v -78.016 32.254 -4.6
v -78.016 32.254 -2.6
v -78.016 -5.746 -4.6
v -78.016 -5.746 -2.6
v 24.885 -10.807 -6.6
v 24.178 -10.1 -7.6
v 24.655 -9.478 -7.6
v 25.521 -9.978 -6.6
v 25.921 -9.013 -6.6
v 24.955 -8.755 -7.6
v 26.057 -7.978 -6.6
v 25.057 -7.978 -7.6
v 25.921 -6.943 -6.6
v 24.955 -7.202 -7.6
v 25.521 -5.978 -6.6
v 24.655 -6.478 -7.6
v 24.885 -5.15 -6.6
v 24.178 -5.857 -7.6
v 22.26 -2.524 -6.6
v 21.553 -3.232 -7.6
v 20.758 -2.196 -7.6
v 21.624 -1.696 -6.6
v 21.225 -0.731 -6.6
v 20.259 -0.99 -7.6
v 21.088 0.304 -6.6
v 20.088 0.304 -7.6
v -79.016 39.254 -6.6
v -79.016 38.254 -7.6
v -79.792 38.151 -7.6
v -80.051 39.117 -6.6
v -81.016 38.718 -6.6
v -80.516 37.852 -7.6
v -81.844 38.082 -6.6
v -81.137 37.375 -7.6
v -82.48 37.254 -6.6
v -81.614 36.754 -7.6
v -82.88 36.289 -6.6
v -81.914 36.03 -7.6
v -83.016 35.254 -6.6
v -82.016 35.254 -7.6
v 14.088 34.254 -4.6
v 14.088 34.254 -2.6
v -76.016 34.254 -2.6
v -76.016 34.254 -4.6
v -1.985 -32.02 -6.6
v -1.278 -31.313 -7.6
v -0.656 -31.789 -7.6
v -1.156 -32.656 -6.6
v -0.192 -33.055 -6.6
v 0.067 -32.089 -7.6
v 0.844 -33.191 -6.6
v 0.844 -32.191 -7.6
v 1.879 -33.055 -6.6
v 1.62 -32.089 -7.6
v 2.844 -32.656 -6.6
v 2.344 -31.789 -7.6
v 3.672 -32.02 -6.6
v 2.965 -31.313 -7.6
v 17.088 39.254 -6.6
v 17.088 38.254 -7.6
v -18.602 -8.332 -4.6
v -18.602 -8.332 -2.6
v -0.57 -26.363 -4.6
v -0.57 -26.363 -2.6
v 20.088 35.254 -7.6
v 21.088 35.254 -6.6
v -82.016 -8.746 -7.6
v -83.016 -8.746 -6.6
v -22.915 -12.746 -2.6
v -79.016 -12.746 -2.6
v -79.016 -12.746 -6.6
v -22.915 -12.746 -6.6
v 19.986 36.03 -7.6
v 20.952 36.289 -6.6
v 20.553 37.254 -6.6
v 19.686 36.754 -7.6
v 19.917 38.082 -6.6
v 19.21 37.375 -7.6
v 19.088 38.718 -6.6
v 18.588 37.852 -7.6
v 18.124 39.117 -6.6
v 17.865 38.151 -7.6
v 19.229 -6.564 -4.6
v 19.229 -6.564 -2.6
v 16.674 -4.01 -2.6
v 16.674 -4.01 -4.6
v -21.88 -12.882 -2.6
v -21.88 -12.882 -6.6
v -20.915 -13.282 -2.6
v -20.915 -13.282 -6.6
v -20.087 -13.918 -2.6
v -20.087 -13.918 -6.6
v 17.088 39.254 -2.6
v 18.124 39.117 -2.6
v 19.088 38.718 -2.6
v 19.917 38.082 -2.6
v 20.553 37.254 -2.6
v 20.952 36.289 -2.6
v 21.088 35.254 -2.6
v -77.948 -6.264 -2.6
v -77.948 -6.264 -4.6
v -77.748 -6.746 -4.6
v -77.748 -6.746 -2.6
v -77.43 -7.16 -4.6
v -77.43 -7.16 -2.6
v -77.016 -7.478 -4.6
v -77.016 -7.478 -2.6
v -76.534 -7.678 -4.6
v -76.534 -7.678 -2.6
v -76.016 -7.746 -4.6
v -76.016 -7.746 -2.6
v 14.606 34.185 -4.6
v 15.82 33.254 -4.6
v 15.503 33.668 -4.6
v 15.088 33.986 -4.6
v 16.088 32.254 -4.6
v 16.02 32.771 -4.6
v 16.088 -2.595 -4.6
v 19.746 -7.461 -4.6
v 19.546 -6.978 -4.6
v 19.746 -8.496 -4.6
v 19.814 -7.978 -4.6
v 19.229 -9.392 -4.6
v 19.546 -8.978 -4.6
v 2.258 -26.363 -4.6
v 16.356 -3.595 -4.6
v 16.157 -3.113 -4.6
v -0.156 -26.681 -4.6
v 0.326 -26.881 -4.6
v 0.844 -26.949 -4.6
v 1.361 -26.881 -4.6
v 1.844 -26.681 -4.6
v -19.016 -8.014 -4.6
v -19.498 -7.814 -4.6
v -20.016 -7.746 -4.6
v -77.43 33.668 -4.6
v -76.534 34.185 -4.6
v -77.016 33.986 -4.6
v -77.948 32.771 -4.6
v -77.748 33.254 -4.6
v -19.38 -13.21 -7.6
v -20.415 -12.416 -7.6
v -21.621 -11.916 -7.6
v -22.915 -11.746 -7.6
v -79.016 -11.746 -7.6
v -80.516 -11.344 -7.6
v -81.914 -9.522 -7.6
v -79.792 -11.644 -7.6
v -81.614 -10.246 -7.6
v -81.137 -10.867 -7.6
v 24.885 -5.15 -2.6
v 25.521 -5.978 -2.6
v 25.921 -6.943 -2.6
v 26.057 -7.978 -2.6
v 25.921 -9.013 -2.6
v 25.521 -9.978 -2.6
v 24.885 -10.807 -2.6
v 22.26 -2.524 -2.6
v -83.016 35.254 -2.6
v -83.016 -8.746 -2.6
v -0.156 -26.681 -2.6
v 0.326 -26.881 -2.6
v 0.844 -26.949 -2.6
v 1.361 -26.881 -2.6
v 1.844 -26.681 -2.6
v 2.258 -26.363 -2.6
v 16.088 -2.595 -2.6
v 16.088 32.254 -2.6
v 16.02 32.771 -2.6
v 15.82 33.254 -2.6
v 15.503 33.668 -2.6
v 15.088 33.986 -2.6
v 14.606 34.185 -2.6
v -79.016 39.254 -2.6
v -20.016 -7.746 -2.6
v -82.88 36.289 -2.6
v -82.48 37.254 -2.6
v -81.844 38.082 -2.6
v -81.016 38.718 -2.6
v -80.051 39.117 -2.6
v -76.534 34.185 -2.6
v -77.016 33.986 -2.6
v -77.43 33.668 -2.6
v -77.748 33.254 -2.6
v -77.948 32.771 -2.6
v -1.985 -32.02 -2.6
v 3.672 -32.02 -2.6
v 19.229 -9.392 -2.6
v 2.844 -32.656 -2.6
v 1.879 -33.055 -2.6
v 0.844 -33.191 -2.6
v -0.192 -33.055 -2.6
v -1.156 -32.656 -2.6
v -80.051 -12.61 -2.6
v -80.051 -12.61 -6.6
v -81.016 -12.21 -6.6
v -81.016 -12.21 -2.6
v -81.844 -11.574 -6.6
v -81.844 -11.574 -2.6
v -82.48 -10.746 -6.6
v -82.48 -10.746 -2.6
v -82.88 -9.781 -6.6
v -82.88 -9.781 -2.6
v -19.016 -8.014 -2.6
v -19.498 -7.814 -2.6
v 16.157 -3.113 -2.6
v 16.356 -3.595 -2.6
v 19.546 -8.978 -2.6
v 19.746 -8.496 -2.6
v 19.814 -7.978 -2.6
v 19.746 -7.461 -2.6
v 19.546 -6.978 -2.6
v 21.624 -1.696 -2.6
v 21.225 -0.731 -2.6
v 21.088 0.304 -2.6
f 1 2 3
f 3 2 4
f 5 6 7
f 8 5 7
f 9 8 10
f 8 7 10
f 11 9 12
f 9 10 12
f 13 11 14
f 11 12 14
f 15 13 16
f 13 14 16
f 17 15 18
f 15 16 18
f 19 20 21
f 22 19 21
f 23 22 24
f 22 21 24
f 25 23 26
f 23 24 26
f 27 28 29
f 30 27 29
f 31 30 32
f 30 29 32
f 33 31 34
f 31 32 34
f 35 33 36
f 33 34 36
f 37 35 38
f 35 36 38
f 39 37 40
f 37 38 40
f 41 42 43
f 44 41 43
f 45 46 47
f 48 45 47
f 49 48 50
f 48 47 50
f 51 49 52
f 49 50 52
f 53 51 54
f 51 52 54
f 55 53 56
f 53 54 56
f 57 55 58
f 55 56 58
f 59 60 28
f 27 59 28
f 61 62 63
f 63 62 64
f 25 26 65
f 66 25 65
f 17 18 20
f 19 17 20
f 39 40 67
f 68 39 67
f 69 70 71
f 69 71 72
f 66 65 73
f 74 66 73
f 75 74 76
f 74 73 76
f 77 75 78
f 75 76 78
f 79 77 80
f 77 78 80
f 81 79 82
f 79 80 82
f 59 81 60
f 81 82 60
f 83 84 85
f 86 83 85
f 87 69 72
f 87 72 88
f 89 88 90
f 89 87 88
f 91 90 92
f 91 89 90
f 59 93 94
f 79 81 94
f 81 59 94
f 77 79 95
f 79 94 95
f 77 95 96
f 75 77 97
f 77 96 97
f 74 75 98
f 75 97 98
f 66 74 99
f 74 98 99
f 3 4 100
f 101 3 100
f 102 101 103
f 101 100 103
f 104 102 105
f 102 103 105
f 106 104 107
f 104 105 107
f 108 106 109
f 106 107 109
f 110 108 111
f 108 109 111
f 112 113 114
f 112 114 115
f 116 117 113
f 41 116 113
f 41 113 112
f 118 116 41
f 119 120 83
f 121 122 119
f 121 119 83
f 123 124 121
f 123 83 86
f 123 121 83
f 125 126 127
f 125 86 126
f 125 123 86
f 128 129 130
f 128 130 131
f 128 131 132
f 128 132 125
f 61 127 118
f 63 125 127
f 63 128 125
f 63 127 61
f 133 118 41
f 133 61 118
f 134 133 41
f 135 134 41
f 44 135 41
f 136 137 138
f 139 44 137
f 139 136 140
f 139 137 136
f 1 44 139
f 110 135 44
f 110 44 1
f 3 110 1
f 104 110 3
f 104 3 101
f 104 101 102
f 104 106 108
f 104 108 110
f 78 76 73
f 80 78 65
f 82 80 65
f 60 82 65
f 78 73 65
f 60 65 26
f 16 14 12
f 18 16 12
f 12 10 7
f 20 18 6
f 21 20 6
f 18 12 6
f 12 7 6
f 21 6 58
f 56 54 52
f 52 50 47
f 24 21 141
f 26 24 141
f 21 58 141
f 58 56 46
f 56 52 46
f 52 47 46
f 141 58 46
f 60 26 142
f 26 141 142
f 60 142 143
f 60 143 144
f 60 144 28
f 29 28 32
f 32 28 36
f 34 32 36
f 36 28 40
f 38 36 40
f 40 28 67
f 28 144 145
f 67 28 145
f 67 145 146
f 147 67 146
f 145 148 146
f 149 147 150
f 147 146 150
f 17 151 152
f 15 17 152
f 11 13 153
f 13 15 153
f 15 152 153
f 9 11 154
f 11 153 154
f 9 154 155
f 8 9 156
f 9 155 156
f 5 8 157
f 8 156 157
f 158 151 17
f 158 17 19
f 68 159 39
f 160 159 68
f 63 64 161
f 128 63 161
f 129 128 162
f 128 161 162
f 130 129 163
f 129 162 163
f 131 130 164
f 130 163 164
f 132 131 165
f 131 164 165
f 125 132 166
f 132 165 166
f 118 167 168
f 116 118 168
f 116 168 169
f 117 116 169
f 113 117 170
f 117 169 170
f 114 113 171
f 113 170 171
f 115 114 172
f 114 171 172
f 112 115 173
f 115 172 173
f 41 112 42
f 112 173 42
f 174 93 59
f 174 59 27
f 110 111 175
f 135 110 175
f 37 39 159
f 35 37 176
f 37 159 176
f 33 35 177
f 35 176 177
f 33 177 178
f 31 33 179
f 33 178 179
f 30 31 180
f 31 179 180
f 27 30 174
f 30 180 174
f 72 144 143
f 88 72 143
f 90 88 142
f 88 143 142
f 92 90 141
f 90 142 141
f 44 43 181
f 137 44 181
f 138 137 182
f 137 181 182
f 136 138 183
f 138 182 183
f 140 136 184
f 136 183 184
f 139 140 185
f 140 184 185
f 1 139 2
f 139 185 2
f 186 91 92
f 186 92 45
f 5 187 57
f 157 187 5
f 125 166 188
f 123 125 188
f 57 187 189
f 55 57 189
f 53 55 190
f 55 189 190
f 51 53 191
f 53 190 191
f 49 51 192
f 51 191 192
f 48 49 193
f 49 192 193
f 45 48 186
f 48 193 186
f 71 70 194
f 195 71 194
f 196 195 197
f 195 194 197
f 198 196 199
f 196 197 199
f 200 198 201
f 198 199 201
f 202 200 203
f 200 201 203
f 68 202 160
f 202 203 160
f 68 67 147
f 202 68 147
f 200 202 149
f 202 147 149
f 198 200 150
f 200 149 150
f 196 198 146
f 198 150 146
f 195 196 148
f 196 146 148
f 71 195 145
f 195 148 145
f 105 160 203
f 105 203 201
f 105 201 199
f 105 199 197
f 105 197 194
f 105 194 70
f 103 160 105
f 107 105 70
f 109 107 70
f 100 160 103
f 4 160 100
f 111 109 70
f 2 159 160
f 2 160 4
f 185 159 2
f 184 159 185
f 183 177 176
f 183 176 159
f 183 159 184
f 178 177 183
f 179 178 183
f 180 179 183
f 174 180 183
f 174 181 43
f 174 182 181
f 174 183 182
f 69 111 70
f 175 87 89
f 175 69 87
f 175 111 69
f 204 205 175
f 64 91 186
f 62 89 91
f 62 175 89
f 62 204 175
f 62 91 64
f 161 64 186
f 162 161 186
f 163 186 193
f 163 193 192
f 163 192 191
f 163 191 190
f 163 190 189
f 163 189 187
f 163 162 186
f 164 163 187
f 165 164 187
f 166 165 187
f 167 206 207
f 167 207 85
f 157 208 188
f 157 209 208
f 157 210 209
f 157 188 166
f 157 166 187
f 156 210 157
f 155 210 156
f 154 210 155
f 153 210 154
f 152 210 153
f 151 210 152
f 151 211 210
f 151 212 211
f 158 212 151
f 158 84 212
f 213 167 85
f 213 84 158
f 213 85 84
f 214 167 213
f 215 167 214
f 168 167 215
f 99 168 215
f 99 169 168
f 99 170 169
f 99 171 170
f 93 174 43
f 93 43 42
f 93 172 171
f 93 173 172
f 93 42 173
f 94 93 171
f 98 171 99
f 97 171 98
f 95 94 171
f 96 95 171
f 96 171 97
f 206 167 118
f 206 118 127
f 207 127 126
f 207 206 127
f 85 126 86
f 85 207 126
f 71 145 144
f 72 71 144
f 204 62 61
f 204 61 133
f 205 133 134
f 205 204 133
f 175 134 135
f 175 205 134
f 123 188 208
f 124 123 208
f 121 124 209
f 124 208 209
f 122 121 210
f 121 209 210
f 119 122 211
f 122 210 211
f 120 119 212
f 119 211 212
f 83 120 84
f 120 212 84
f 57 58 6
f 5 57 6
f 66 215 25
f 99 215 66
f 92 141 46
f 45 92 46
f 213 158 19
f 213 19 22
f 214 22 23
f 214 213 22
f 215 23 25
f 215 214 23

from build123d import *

# Parameters (mm, degrees)
PAD002_DEPTH = 2
PAD003_DEPTH = 3
CHAMFER_SIZE = 1


with BuildPart() as part:
    # Sketch002 → Pad002 (new body)
    with BuildSketch(Plane.XY):
        with BuildLine():
            Line((17.088408, 39.253582), (-79.015923, 39.253582))
            ThreePointArc((-79.015923, 39.253582), (-81.84435, 38.082009), (-83.015923, 35.253582))
            Line((-83.015923, 35.253582), (-83.015923, -8.745983))
            ThreePointArc((-83.015923, -8.745983), (-81.84435, -11.57441), (-79.015923, -12.745983))
            Line((-79.015923, -12.745983), (-22.915418, -12.745983))
            ThreePointArc((-20.086991, -13.917556), (-21.384684, -13.050465), (-22.915418, -12.745983))
            Line((-20.086991, -13.917556), (-1.9847, -32.019847))
            ThreePointArc((-1.9847, -32.019847), (0.843727, -33.191419), (3.672154, -32.019847))
            Line((3.672154, -32.019847), (24.885358, -10.806643))
            ThreePointArc((24.885358, -10.806643), (26.05693, -7.978216), (24.885358, -5.149789))
            Line((24.885358, -5.149789), (22.259981, -2.524412))
            ThreePointArc((21.088408, 0.304015), (21.39289, -1.226719), (22.259981, -2.524412))
            Line((21.088408, 0.304015), (21.088408, 35.253582))
            ThreePointArc((21.088408, 35.253582), (19.916835, 38.082009), (17.088408, 39.253582))
        make_face()
        with BuildLine():
            Line((14.088408, 34.253582), (-76.015923, 34.253582))
            ThreePointArc((-76.015923, 34.253582), (-77.430137, 33.667796), (-78.015923, 32.253582))
            Line((-78.015923, 32.253582), (-78.015923, -5.745983))
            ThreePointArc((-78.015923, -5.745983), (-77.430137, -7.160197), (-76.015923, -7.745983))
            Line((-76.015923, -7.745983), (-20.015923, -7.745983))
            ThreePointArc((-18.601709, -8.331769), (-19.250556, -7.898224), (-20.015923, -7.745983))
            Line((-18.601709, -8.331769), (-0.570487, -26.362992))
            ThreePointArc((-0.570487, -26.362992), (0.843727, -26.948779), (2.257941, -26.362992))
            Line((2.257941, -26.362992), (19.228503, -9.39243))
            ThreePointArc((19.228503, -9.39243), (19.81429, -7.978216), (19.228503, -6.564002))
            Line((19.228503, -6.564002), (16.674194, -4.009694))
            ThreePointArc((16.088408, -2.59548), (16.240649, -3.360847), (16.674194, -4.009694))
            Line((16.088408, -2.59548), (16.088408, 32.253582))
            ThreePointArc((16.088408, 32.253582), (15.502622, 33.667796), (14.088408, 34.253582))
        make_face(mode=Mode.SUBTRACT)
    extrude(amount=-PAD002_DEPTH)

    # Sketch003 (on Face30 of Pad002) → Pad003 (join)
    with BuildSketch(Plane(origin=(0, 0, -2), x_dir=(1, 0, 0), z_dir=(0, 0, -1))):
        with BuildLine():
            Line((-79.015923, 12.745983), (-22.915418, 12.745983))
            ThreePointArc((-22.915418, 12.745983), (-21.384684, 13.050465), (-20.086991, 13.917556))
            Line((-20.086991, 13.917556), (-1.9847, 32.019847))
            ThreePointArc((3.672154, 32.019847), (0.843727, 33.191419), (-1.9847, 32.019847))
            Line((3.672154, 32.019847), (24.885358, 10.806643))
            ThreePointArc((24.885358, 5.149789), (26.05693, 7.978216), (24.885358, 10.806643))
            Line((24.885358, 5.149789), (22.259981, 2.524412))
            ThreePointArc((22.259981, 2.524412), (21.39289, 1.226719), (21.088408, -0.304015))
            Line((21.088408, -0.304015), (21.088408, -35.253582))
            ThreePointArc((17.088408, -39.253582), (19.916835, -38.082009), (21.088408, -35.253582))
            Line((17.088408, -39.253582), (-79.015923, -39.253582))
            ThreePointArc((-83.015923, -35.253582), (-81.84435, -38.082009), (-79.015923, -39.253582))
            Line((-83.015923, -35.253582), (-83.015923, 8.745983))
            ThreePointArc((-79.015923, 12.745983), (-81.84435, 11.57441), (-83.015923, 8.745983))
        make_face()
    extrude(amount=PAD003_DEPTH)

    # Chamfer
    chamfer_edges = [part.edges().sort_by_distance(p)[0] for p in [
        (-83.015923, 13.2538, -5),
        (-81.84435, -11.57441, -5),
        (-50.96567, -12.745983, -5),
        (-21.384684, -13.050465, -5),
        (-11.035845, -22.968701, -5),
        (0.843727, -33.191419, -5),
        (14.278756, -21.413245, -5),
        (26.05693, -7.978216, -5),
        (23.572669, -3.837101, -5),
        (21.39289, -1.226719, -5),
        (21.088408, 17.778798, -5),
        (19.916835, 38.082009, -5),
        (-30.963758, 39.253582, -5),
        (-81.84435, 38.082009, -5),
    ]]
    chamfer(chamfer_edges, length=CHAMFER_SIZE)


with BuildPart() as part_1:
    # Body001 placement: moved
    add(part.part.moved(Location((0, 0, -2.6))))


solid = part_1.part
